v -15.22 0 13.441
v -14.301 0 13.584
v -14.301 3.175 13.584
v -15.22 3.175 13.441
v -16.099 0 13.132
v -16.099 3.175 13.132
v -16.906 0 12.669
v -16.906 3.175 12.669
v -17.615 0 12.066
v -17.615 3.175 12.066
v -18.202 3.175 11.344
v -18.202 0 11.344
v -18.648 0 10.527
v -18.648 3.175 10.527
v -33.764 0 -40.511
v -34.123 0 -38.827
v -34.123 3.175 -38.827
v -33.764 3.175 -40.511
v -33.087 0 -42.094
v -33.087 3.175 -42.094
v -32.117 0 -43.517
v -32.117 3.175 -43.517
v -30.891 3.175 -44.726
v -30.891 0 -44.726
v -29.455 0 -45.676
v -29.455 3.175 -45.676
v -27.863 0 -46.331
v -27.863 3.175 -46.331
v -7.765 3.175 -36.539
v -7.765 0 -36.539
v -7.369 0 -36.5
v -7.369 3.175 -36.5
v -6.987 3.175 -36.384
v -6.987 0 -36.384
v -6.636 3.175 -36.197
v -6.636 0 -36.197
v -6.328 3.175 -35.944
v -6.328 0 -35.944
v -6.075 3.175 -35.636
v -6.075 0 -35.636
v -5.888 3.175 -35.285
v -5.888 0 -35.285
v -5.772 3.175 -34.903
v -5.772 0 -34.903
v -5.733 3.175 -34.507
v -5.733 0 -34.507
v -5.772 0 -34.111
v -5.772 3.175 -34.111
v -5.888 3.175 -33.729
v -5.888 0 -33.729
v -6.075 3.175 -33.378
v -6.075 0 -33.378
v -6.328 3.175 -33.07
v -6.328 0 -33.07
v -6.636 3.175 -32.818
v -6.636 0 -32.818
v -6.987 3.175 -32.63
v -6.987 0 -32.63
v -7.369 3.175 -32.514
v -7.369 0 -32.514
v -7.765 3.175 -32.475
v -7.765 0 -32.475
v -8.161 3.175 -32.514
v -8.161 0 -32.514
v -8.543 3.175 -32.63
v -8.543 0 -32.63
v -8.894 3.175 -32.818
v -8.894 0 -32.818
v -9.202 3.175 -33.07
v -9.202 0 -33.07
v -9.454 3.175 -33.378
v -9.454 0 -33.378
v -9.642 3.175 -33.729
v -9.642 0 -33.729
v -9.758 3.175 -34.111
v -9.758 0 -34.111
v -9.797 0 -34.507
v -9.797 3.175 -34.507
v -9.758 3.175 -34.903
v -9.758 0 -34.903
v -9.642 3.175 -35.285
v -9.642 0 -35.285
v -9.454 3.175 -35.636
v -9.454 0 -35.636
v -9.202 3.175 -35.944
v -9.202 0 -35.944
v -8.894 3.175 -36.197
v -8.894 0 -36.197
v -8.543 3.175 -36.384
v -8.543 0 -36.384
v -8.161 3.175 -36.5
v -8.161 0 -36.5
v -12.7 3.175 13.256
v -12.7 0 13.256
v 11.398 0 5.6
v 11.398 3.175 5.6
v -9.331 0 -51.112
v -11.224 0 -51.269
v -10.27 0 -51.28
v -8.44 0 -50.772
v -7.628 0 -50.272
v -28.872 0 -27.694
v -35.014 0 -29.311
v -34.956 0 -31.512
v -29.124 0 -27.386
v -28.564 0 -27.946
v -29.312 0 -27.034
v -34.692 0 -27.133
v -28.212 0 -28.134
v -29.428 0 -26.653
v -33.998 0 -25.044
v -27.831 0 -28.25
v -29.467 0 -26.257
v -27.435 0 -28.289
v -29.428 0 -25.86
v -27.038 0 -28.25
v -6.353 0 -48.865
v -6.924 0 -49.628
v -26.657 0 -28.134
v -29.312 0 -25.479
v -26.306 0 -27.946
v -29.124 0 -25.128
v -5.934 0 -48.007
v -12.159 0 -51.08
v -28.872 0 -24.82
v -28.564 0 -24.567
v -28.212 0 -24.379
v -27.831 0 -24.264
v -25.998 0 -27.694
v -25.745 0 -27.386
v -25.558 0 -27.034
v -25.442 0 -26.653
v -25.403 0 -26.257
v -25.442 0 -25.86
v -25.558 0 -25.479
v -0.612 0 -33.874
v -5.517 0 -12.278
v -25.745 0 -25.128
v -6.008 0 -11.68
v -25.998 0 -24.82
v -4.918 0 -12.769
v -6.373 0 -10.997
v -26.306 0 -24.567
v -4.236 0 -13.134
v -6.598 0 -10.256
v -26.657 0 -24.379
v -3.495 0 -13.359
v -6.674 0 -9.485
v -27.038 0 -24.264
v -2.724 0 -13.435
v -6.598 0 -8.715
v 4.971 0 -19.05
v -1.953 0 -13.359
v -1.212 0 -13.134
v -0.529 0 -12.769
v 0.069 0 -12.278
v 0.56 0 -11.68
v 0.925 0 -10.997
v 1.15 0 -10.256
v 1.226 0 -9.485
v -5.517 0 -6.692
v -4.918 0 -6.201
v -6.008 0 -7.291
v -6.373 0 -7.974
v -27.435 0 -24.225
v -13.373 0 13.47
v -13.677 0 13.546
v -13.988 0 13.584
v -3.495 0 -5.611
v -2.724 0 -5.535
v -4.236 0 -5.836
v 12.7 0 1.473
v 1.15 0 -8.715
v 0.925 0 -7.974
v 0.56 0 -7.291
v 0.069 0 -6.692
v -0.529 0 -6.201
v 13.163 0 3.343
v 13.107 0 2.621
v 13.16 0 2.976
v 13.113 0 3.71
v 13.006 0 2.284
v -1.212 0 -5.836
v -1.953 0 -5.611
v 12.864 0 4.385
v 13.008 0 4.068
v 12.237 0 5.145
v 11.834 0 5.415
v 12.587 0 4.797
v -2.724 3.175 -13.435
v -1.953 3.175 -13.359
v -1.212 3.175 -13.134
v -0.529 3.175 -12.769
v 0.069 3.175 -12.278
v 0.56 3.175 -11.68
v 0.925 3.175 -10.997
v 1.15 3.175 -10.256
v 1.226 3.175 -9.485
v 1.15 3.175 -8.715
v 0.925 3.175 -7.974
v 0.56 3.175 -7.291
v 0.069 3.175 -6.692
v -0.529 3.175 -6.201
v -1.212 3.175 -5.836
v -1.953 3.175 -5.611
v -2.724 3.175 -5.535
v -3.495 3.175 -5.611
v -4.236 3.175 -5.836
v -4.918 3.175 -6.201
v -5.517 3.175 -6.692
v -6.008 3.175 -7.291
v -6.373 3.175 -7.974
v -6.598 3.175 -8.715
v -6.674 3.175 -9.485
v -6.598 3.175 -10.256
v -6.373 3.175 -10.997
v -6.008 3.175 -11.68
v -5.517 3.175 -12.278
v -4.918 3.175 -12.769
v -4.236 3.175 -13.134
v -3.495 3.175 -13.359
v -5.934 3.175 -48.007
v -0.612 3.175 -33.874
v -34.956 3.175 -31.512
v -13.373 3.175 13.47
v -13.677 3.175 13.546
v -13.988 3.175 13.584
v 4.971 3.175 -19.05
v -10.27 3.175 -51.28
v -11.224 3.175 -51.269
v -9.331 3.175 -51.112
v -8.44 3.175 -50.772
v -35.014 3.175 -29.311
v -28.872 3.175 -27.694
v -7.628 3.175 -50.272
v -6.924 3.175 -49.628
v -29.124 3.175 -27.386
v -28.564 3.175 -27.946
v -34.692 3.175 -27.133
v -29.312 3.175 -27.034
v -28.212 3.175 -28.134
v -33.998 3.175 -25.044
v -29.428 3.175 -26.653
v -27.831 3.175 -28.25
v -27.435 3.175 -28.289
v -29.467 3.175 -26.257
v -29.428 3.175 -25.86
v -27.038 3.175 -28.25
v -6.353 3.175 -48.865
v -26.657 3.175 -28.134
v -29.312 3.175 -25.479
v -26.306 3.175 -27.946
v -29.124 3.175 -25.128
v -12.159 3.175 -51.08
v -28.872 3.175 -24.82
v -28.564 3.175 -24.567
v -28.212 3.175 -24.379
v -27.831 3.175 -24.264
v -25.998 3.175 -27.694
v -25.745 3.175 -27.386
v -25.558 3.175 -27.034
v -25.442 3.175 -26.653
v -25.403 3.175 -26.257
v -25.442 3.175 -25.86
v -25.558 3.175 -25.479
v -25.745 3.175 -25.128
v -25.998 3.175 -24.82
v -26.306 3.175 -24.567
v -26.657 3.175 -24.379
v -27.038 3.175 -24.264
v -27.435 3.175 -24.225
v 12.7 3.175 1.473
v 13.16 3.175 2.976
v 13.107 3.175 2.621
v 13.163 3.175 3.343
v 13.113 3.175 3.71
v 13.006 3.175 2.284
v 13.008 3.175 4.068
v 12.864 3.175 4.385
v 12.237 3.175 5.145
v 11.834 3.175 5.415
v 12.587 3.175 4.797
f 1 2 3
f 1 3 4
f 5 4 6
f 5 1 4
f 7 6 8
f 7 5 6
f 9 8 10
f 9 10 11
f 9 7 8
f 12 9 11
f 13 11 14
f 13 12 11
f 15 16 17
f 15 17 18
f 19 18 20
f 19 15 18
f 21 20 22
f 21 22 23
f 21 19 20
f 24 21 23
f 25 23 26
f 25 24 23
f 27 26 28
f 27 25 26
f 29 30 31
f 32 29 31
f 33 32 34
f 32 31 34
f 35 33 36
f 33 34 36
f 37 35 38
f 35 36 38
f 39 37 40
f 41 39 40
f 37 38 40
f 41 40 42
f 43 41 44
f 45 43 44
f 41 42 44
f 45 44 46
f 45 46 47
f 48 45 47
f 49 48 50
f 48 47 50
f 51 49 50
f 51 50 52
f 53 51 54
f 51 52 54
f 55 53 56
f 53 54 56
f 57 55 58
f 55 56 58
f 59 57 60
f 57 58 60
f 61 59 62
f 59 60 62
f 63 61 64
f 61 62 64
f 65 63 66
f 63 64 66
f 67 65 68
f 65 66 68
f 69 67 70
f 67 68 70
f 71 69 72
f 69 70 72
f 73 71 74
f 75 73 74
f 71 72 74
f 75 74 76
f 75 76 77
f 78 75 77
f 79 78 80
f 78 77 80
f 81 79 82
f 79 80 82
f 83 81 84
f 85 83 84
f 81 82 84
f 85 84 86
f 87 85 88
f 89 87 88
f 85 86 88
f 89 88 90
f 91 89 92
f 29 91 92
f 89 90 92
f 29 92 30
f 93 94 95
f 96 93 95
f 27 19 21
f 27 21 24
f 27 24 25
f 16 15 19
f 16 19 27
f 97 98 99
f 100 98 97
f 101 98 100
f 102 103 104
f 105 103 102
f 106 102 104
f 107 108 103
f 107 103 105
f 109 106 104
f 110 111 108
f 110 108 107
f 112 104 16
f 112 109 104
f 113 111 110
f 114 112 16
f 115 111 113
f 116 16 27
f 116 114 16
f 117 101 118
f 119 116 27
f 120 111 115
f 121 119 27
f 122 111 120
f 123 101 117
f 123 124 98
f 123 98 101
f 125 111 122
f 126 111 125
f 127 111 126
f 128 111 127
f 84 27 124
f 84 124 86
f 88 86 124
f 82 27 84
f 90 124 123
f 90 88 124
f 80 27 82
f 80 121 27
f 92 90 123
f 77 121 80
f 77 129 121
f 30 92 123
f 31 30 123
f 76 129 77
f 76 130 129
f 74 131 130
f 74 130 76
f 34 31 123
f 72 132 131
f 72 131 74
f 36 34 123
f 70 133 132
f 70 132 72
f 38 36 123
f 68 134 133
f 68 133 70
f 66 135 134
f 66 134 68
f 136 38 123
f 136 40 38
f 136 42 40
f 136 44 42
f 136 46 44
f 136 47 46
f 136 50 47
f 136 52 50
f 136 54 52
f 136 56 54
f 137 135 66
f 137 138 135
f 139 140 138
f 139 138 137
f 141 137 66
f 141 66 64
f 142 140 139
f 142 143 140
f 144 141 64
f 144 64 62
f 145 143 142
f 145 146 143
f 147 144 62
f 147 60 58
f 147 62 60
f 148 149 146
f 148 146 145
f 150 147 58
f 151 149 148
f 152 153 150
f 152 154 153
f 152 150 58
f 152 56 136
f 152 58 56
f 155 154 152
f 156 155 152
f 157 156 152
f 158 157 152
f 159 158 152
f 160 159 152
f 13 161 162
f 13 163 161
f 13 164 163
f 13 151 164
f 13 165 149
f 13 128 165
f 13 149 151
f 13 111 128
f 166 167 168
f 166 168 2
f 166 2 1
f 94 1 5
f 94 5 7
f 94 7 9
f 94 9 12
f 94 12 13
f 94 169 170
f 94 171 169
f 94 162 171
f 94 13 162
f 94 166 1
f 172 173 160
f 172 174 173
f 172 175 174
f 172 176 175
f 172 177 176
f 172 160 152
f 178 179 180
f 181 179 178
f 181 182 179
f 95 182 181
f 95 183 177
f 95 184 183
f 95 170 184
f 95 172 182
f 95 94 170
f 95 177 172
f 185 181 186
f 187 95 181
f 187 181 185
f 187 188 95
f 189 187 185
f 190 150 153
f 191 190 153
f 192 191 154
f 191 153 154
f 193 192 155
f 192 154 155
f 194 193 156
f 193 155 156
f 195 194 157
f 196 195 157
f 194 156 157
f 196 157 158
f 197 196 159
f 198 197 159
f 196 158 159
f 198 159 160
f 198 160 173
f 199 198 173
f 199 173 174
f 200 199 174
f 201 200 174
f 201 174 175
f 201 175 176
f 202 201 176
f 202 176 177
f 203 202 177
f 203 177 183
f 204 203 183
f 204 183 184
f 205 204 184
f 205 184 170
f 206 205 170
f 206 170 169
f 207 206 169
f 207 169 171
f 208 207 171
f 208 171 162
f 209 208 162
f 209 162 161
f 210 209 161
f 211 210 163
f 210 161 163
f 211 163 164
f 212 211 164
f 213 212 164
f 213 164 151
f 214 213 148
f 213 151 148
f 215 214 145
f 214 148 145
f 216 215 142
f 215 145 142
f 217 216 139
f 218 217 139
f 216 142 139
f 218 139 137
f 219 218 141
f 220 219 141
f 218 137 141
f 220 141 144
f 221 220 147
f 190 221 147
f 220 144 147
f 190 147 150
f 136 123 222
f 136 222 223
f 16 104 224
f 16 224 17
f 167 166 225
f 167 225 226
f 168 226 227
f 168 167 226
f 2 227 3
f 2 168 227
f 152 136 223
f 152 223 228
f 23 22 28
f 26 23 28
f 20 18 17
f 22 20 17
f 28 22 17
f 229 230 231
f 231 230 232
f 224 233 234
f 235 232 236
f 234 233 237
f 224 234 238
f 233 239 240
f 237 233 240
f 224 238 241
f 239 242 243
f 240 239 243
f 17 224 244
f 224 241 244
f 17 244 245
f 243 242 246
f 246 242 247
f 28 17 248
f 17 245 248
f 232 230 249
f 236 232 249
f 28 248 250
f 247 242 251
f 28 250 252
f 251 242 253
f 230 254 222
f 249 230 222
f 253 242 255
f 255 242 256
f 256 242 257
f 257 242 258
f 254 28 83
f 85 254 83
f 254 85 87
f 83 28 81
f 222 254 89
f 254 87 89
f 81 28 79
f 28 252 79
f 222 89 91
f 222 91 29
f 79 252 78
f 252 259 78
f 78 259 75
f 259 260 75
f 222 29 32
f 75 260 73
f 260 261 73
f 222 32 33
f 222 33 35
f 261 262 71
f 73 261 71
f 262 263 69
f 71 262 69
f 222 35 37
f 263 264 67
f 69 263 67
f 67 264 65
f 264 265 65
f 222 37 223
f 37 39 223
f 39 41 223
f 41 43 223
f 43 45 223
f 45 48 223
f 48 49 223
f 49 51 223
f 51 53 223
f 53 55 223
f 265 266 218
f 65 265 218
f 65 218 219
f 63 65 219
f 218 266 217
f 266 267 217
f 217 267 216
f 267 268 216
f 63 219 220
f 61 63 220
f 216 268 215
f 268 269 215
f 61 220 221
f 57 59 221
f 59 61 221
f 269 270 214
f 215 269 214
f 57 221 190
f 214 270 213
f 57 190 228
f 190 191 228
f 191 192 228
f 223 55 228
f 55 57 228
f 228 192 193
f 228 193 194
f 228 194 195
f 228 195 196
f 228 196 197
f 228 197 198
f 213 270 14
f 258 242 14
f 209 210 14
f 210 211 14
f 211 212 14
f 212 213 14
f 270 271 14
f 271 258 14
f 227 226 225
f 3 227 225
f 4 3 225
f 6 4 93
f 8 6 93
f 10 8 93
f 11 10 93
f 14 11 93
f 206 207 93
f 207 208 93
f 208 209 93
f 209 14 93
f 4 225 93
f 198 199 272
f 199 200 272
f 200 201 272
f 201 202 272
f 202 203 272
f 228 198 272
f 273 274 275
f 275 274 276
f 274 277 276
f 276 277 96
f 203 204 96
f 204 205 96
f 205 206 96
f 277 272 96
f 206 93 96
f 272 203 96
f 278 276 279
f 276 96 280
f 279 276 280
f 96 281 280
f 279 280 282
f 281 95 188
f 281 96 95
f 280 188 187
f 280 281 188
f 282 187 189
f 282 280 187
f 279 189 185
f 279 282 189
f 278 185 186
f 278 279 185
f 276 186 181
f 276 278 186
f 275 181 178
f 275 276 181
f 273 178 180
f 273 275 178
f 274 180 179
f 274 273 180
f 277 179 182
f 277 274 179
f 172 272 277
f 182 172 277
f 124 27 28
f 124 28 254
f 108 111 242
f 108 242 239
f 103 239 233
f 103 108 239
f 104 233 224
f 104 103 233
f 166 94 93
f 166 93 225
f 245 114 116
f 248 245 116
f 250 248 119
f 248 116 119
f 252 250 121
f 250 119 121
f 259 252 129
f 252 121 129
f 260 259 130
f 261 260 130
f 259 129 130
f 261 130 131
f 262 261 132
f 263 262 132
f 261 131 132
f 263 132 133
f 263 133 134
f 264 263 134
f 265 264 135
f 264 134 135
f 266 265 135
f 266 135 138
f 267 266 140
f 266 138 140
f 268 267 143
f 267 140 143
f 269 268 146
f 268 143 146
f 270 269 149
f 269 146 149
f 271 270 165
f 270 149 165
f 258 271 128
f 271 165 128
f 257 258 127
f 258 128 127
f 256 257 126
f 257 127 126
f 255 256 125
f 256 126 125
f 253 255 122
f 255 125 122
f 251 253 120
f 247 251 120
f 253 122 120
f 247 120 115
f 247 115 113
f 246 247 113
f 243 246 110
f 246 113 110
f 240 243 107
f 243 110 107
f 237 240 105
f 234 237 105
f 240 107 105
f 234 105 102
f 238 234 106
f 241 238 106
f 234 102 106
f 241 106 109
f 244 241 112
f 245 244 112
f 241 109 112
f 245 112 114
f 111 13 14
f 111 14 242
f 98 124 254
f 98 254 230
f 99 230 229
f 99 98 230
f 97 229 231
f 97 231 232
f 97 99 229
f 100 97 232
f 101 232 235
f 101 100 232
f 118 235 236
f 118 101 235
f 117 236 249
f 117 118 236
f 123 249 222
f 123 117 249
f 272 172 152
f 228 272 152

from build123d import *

# Parameters (mm, degrees)
BOSS_EXTRUDE1_DEPTH = 3.175
SKETCH2_R           = 2.032
BOSS_EXTRUDE2_DEPTH = 3.175
SKETCH2_3_R         = 3.95
CUT_EXTRUDE1_DEPTH  = 63.201892938
FILLET1_R           = 2.54


with BuildPart() as part:
    # Sketch1 → Boss-Extrude1 (new body)
    with BuildSketch(Plane(origin=(0, 0, 0), x_dir=(1, 0, 0), z_dir=(0, 1, 0))):
        Polygon((25.4, -6.35), (12.7, -6.35), (12.7, 19.05), (-12.7, 19.05), (-12.7, -19.05), (25.4, -19.05), align=None)
    extrude(amount=BOSS_EXTRUDE1_DEPTH)

    # Sketch2 → Boss-Extrude2 (add)
    # profile 1 of 2: a face of its own
    with BuildSketch(Plane.XZ):
        Polygon((12.7, 1.472649747), (13.949167892, 4.789594929), (12.7, 5.186439946), align=None)
    # profile 2 of 2: a face of its own
    with BuildSketch(Plane.XZ):
        with BuildLine():
            Line((-12.7, 13.255702289), (-13.373056837, 13.469524029))
            ThreePointArc((-13.373056837, 13.469524029), (-13.831582673, 13.569694165), (-14.300710901, 13.583790422))
            ThreePointArc((-14.300710901, 13.583790422), (-16.90590193, 12.668940106), (-18.647730427, 10.526510437))
            Line((-18.647730427, 10.526510437), (-33.997782473, -25.04377908))
            ThreePointArc((-33.997782473, -25.04377908), (-34.900150323, -28.214966504), (-34.955795775, -31.511570969))
            Line((-34.955795775, -31.511570969), (-34.123437377, -38.826910048))
            ThreePointArc((-34.123437377, -38.826910048), (-32.117046877, -43.516551498), (-27.863250656, -46.331432931))
            Line((-27.863250656, -46.331432931), (-12.15852304, -51.079668538))
            ThreePointArc((-12.15852304, -51.079668538), (-8.439878849, -50.772366449), (-5.934296975, -48.007441738))
            Line((-5.934296975, -48.007441738), (-0.611549336, -33.873823471))
            Line((-0.611549336, -33.873823471), (4.971130901, -19.05))
            Line((4.971130901, -19.05), (-12.7, -19.05))
            Line((-12.7, -19.05), (-12.7, 8.957831881))
            Line((-12.7, 8.957831881), (-12.7, 13.255702289))
        make_face()
        with Locations((-27.434824274, -26.25669415)):
            Circle(SKETCH2_R, mode=Mode.SUBTRACT)
        with Locations((-7.764936406, -34.507055205)):
            Circle(SKETCH2_R, mode=Mode.SUBTRACT)
    extrude(amount=-BOSS_EXTRUDE2_DEPTH)

    # Sketch2<3> → Cut-Extrude1 (cut, through all)
    with BuildSketch(Plane.XZ):
        Polygon((-12.7, 13.255702289), (12.7, 5.186439946), (12.7, 6.35), (25.4, 6.35), (25.4, 19.05), (-12.7, 19.05), align=None)
        Polygon((12.7, -19.05), (12.7, 1.472649747), (4.971130901, -19.05), align=None)
        with Locations((-2.723911437, -9.485123164)):
            Circle(SKETCH2_3_R)
    extrude(amount=-CUT_EXTRUDE1_DEPTH, mode=Mode.SUBTRACT)

    # Fillet1
    fillet1_edges = [part.edges().sort_by_distance(p)[0] for p in [
        (13.949167892, 1.5875, 4.789594929),
    ]]
    fillet(fillet1_edges, radius=FILLET1_R)


solid = part.part
